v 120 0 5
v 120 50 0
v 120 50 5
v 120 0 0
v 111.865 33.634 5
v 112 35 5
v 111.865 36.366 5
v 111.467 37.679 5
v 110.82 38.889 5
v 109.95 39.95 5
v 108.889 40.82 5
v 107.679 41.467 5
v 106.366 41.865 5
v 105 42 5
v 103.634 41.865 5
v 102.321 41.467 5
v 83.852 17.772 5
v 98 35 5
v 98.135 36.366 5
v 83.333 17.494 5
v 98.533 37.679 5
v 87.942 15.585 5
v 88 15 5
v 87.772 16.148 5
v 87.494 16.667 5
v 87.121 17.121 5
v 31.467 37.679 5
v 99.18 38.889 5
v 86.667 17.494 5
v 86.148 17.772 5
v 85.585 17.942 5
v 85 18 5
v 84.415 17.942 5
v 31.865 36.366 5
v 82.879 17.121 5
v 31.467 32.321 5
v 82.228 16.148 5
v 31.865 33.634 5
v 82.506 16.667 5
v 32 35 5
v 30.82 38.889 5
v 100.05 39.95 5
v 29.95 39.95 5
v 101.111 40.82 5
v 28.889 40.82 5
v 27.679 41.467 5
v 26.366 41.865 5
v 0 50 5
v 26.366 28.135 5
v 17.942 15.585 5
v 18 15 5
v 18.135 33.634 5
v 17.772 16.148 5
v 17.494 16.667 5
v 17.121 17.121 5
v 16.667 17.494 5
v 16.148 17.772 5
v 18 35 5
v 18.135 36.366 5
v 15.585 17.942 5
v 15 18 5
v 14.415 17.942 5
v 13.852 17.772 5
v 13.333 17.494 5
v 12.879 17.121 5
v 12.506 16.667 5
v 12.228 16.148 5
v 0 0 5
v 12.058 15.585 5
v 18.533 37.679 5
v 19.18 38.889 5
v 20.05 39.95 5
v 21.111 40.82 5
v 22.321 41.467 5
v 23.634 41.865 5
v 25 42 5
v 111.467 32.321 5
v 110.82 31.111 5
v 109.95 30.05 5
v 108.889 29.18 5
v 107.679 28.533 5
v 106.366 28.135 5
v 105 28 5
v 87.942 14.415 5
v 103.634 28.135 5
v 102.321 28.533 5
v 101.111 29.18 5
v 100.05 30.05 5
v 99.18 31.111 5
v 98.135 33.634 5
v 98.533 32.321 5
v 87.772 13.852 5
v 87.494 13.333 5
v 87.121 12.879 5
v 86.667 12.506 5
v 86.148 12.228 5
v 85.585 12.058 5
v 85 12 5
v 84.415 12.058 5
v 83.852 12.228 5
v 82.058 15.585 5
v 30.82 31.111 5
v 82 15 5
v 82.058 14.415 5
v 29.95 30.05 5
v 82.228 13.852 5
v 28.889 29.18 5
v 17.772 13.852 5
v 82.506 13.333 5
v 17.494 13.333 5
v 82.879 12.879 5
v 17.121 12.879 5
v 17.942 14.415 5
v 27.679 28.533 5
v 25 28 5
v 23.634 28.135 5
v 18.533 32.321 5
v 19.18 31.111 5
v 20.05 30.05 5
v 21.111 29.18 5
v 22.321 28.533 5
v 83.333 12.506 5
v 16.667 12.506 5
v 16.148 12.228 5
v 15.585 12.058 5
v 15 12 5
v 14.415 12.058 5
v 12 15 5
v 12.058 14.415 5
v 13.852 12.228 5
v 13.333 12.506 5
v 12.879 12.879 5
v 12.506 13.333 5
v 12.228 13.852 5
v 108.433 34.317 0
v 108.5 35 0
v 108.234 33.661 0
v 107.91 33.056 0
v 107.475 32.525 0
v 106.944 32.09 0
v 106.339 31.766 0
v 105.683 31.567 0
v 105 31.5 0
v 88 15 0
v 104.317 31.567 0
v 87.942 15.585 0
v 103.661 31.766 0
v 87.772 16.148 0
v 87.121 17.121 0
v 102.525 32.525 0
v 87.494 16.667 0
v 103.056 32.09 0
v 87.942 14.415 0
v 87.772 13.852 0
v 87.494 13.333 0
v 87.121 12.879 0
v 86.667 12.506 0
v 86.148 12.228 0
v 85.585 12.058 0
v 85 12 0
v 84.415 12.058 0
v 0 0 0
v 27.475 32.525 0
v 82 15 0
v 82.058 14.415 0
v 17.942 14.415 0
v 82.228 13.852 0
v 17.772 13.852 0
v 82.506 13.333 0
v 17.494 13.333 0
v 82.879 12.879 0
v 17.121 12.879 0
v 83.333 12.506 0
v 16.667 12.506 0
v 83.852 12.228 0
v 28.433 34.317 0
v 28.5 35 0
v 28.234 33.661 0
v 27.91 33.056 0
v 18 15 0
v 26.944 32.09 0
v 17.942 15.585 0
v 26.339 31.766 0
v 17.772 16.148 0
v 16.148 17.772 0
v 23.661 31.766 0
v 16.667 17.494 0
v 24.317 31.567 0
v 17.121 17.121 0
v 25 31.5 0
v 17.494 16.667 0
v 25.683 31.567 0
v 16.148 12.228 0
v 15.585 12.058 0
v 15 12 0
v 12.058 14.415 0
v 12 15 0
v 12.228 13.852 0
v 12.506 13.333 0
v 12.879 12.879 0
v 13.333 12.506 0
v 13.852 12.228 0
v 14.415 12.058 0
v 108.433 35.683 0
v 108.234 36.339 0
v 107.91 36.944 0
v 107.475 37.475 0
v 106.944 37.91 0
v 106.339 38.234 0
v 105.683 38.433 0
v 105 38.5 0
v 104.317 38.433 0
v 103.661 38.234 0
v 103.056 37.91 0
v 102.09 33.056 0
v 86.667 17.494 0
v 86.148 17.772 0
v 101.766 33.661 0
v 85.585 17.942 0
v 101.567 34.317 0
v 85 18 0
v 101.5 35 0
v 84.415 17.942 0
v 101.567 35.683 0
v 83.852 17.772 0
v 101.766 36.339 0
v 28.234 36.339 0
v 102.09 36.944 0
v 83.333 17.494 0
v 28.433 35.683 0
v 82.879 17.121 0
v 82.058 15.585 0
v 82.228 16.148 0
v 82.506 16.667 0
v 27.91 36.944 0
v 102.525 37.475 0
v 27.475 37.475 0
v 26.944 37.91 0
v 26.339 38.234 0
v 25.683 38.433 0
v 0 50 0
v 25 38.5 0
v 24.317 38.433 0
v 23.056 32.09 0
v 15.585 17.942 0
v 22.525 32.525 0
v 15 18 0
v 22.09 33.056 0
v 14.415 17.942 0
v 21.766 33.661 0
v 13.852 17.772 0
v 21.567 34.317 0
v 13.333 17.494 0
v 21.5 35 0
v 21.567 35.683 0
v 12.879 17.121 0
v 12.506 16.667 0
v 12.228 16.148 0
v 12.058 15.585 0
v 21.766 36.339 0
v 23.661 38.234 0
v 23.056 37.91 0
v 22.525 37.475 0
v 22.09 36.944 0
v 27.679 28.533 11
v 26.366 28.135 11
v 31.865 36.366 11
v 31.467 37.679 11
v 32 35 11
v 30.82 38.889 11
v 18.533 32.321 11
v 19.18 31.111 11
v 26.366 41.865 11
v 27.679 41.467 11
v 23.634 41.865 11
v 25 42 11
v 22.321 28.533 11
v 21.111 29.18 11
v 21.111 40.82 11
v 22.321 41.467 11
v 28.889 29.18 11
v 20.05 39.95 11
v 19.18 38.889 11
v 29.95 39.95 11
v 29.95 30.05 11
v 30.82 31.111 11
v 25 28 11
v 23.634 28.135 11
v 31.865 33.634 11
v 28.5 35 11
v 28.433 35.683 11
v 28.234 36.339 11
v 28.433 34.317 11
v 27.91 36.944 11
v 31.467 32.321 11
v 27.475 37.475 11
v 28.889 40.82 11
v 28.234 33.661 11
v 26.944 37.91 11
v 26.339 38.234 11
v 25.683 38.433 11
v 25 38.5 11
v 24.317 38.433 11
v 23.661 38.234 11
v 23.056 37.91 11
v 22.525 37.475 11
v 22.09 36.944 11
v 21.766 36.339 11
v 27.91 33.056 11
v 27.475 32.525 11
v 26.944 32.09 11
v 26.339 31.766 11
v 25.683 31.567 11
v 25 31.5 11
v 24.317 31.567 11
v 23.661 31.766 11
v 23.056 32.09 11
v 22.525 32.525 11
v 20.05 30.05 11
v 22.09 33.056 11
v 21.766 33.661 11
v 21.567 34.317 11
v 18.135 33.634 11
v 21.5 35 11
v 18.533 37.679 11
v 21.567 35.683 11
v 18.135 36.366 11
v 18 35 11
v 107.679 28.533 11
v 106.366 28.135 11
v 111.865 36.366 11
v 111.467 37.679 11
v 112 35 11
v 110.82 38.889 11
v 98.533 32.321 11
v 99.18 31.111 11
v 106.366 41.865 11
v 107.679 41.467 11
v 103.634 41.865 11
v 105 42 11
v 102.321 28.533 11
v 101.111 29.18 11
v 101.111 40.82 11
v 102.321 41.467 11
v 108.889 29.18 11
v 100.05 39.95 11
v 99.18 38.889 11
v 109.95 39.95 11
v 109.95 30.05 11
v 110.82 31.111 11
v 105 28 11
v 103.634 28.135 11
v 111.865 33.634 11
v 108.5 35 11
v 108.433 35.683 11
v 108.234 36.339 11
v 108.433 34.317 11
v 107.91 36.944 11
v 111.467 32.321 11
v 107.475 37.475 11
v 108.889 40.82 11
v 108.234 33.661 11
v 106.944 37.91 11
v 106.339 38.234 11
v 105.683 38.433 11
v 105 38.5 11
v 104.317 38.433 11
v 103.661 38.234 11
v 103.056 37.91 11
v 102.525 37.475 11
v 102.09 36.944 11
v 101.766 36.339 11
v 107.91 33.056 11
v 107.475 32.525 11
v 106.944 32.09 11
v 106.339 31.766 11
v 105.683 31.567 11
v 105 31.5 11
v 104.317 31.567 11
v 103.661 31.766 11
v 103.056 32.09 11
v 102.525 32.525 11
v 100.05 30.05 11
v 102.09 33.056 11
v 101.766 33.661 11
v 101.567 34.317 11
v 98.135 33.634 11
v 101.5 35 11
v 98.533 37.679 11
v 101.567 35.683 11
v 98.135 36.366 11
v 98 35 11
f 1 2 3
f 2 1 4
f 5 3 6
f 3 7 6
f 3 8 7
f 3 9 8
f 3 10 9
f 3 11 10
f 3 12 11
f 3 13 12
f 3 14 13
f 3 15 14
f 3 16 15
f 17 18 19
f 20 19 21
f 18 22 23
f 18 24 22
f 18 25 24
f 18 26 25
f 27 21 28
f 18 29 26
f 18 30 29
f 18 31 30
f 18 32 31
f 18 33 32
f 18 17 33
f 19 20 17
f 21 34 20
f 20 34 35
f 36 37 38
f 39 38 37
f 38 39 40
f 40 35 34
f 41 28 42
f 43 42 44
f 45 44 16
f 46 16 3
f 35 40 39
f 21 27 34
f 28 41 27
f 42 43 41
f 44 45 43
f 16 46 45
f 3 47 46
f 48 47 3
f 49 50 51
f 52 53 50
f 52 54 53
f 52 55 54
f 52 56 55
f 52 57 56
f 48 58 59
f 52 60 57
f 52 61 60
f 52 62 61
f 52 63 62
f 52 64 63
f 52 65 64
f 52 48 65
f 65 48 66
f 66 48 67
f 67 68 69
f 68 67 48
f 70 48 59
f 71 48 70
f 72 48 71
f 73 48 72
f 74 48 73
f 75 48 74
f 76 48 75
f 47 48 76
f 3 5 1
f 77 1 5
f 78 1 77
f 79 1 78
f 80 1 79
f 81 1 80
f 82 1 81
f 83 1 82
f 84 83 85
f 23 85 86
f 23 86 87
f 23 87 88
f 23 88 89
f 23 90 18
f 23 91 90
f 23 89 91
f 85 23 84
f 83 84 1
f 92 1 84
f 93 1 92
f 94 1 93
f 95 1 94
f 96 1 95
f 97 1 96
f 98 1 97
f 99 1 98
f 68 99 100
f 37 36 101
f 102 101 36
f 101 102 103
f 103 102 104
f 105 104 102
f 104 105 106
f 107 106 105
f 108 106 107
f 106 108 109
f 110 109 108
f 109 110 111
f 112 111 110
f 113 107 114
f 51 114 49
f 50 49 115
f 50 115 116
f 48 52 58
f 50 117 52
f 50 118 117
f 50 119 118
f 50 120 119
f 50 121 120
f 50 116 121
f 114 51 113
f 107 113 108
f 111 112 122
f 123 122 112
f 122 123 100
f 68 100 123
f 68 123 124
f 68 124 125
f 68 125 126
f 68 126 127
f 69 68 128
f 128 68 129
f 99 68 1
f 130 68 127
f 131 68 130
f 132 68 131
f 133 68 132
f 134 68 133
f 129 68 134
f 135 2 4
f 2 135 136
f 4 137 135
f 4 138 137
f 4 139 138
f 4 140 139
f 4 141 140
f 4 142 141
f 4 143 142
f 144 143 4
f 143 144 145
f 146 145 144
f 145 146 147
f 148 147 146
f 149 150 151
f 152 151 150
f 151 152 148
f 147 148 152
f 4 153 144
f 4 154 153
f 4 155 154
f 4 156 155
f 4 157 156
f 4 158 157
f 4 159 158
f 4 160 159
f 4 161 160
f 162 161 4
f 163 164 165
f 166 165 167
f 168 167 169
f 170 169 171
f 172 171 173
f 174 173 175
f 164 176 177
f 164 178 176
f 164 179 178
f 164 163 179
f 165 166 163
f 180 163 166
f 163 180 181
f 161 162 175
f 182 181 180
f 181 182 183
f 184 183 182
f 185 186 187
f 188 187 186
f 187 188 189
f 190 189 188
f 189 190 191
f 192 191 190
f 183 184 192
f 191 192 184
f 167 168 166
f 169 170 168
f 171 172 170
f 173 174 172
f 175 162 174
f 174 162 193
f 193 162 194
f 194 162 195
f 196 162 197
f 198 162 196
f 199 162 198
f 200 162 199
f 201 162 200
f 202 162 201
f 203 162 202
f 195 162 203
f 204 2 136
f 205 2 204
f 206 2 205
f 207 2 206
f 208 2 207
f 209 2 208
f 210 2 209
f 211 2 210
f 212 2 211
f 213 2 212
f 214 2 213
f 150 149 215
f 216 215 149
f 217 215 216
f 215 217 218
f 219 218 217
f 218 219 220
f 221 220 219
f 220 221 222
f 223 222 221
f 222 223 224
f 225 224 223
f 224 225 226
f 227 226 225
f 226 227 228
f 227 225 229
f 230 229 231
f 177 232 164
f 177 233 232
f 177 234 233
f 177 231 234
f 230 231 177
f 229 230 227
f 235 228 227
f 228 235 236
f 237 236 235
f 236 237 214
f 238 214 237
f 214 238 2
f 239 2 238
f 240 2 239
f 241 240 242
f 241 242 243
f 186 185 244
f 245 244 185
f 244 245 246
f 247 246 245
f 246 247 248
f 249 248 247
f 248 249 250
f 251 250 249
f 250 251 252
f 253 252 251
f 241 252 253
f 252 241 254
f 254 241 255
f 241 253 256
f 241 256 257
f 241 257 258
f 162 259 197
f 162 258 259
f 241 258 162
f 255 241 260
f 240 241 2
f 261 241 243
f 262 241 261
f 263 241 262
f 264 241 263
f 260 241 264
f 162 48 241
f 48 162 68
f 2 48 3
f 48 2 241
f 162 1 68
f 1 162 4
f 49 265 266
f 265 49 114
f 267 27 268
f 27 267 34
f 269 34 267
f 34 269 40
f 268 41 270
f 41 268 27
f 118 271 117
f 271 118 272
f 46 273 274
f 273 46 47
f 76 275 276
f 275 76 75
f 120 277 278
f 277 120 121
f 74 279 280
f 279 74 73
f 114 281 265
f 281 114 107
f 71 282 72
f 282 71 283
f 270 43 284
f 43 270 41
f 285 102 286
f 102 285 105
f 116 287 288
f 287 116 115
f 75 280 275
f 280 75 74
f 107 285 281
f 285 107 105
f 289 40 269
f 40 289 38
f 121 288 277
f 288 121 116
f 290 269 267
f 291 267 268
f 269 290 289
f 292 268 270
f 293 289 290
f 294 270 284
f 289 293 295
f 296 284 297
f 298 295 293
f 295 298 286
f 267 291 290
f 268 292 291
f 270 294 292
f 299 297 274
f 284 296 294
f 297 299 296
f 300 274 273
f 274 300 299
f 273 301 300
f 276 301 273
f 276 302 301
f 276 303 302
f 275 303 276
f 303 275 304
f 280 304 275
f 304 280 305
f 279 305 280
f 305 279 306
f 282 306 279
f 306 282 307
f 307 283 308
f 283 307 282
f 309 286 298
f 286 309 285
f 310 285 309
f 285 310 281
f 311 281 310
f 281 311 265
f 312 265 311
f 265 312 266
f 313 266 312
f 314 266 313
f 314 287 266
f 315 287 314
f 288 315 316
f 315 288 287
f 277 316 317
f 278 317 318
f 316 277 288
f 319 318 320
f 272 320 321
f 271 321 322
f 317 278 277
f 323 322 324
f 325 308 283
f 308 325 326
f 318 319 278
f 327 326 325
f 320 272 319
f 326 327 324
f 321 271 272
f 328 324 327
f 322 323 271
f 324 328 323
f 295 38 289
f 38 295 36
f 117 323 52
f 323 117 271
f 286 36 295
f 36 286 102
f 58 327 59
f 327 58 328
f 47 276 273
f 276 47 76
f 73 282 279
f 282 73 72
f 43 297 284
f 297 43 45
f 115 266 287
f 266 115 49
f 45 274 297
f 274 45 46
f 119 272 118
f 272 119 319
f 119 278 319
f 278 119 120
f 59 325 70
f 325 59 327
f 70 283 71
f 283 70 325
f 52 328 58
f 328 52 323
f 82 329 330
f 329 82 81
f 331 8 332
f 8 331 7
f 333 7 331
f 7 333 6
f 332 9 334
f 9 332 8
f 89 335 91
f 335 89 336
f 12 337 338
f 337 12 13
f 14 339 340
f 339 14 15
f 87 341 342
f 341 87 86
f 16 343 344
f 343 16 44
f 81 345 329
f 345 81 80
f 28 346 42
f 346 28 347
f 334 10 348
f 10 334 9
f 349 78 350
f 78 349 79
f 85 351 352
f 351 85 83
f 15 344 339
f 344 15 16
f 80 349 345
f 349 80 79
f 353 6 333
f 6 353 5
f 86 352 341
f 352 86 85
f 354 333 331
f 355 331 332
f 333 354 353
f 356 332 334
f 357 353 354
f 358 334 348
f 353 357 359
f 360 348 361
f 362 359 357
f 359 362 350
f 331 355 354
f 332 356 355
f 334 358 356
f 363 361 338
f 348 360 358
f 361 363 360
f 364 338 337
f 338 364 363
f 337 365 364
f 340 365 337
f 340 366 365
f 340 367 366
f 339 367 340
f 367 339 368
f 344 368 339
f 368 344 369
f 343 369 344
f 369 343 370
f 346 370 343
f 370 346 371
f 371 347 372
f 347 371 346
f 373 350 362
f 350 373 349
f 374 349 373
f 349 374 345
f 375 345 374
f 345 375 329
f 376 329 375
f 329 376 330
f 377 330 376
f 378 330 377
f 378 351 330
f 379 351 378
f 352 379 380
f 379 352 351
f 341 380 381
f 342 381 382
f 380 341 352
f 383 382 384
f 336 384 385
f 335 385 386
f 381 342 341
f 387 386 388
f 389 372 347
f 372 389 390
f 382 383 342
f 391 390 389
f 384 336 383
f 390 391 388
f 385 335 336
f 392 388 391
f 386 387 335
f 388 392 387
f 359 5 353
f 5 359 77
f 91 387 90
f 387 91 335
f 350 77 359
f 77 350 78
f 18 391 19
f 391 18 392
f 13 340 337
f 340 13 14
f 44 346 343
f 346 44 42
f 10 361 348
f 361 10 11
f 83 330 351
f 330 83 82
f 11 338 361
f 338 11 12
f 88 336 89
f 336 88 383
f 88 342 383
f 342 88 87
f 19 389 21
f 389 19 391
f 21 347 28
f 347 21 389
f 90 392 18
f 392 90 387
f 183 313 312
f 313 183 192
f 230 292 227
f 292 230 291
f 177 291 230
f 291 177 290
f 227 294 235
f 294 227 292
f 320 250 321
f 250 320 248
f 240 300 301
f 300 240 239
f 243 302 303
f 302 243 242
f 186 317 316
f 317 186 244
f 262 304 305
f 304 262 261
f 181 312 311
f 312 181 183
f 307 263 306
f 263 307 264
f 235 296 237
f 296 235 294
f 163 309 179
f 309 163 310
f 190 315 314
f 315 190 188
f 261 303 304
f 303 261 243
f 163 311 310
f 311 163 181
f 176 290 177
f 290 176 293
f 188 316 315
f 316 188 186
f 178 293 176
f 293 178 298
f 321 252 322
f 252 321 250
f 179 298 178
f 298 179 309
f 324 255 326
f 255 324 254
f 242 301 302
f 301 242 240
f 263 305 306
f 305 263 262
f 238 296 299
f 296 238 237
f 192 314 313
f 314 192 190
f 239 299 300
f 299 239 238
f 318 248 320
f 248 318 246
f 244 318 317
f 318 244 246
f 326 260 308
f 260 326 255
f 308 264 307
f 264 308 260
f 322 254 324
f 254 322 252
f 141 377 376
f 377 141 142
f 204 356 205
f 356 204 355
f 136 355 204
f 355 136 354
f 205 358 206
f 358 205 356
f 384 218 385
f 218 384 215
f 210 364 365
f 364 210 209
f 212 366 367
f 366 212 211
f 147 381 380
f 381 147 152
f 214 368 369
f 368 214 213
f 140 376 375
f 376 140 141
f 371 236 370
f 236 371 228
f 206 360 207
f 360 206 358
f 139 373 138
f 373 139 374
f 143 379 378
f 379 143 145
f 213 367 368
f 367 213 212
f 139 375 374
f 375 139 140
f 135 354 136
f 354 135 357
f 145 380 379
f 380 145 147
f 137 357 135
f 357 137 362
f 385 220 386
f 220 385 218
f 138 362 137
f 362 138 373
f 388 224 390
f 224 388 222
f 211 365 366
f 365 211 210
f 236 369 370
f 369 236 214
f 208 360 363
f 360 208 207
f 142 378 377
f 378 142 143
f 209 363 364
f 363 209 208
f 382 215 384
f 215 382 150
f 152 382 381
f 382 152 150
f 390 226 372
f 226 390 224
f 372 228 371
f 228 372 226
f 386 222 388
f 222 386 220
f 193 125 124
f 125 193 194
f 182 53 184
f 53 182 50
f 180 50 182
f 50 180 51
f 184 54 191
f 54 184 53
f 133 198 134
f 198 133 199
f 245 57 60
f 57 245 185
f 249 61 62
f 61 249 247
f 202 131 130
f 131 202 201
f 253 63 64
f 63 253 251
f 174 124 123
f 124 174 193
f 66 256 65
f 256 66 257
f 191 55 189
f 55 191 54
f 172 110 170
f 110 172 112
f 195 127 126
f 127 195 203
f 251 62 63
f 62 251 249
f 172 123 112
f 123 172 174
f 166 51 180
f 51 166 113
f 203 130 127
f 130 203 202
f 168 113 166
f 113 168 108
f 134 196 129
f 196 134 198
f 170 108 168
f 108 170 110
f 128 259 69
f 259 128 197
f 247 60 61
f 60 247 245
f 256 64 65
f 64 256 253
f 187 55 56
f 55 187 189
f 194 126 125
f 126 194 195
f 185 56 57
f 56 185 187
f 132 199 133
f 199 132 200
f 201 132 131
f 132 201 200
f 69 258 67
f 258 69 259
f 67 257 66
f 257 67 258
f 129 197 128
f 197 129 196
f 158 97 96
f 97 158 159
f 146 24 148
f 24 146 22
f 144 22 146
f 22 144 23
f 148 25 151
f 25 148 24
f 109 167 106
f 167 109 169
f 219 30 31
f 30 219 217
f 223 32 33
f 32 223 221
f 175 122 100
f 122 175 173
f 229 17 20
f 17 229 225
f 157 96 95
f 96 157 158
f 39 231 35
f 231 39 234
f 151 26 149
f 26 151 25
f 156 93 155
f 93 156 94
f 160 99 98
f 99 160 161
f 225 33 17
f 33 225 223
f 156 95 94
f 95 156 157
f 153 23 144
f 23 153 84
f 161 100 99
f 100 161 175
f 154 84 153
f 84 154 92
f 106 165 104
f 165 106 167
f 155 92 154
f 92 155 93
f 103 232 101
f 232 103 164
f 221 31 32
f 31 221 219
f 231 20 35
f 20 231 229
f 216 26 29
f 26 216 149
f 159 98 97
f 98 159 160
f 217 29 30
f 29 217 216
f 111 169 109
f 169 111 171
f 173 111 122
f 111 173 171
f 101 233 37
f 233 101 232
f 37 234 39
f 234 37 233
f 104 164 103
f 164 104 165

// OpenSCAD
$fn = 32;

// ----------------------------------------------------------------------
// Mixed field: bosses and holes at given coordinates
// ----------------------------------------------------------------------

// --- parameters (mm) ---
plate_l = 120;            // plate length, X
plate_w = 50;             // plate width, Y
plate_t = 5;              // plate thickness, Z
boss_d = 14;              // boss diameter
boss_h = 6;               // boss height above the plate
hole_d = 6;               // through hole diameter
fit_tol = 0.02;           // tolerance for press fits, mm
free_tol = 0.2;           // tolerance for clearance fits, mm

total_h = plate_t + boss_h;  // overall height

difference() {
  union() {
    cube([plate_l, plate_w, plate_t]);
    translate([25, 35, plate_t]) cylinder(h = boss_h, d = boss_d);
    translate([105, 35, plate_t]) cylinder(h = boss_h, d = boss_d);
  }
  translate([25, 35, -1]) cylinder(h = total_h + 2, d = boss_d / 2);
  translate([105, 35, -1]) cylinder(h = total_h + 2, d = boss_d / 2);
  translate([15, 15, -1]) cylinder(h = plate_t + 2, d = hole_d);
  translate([85, 15, -1]) cylinder(h = plate_t + 2, d = hole_d);
}
